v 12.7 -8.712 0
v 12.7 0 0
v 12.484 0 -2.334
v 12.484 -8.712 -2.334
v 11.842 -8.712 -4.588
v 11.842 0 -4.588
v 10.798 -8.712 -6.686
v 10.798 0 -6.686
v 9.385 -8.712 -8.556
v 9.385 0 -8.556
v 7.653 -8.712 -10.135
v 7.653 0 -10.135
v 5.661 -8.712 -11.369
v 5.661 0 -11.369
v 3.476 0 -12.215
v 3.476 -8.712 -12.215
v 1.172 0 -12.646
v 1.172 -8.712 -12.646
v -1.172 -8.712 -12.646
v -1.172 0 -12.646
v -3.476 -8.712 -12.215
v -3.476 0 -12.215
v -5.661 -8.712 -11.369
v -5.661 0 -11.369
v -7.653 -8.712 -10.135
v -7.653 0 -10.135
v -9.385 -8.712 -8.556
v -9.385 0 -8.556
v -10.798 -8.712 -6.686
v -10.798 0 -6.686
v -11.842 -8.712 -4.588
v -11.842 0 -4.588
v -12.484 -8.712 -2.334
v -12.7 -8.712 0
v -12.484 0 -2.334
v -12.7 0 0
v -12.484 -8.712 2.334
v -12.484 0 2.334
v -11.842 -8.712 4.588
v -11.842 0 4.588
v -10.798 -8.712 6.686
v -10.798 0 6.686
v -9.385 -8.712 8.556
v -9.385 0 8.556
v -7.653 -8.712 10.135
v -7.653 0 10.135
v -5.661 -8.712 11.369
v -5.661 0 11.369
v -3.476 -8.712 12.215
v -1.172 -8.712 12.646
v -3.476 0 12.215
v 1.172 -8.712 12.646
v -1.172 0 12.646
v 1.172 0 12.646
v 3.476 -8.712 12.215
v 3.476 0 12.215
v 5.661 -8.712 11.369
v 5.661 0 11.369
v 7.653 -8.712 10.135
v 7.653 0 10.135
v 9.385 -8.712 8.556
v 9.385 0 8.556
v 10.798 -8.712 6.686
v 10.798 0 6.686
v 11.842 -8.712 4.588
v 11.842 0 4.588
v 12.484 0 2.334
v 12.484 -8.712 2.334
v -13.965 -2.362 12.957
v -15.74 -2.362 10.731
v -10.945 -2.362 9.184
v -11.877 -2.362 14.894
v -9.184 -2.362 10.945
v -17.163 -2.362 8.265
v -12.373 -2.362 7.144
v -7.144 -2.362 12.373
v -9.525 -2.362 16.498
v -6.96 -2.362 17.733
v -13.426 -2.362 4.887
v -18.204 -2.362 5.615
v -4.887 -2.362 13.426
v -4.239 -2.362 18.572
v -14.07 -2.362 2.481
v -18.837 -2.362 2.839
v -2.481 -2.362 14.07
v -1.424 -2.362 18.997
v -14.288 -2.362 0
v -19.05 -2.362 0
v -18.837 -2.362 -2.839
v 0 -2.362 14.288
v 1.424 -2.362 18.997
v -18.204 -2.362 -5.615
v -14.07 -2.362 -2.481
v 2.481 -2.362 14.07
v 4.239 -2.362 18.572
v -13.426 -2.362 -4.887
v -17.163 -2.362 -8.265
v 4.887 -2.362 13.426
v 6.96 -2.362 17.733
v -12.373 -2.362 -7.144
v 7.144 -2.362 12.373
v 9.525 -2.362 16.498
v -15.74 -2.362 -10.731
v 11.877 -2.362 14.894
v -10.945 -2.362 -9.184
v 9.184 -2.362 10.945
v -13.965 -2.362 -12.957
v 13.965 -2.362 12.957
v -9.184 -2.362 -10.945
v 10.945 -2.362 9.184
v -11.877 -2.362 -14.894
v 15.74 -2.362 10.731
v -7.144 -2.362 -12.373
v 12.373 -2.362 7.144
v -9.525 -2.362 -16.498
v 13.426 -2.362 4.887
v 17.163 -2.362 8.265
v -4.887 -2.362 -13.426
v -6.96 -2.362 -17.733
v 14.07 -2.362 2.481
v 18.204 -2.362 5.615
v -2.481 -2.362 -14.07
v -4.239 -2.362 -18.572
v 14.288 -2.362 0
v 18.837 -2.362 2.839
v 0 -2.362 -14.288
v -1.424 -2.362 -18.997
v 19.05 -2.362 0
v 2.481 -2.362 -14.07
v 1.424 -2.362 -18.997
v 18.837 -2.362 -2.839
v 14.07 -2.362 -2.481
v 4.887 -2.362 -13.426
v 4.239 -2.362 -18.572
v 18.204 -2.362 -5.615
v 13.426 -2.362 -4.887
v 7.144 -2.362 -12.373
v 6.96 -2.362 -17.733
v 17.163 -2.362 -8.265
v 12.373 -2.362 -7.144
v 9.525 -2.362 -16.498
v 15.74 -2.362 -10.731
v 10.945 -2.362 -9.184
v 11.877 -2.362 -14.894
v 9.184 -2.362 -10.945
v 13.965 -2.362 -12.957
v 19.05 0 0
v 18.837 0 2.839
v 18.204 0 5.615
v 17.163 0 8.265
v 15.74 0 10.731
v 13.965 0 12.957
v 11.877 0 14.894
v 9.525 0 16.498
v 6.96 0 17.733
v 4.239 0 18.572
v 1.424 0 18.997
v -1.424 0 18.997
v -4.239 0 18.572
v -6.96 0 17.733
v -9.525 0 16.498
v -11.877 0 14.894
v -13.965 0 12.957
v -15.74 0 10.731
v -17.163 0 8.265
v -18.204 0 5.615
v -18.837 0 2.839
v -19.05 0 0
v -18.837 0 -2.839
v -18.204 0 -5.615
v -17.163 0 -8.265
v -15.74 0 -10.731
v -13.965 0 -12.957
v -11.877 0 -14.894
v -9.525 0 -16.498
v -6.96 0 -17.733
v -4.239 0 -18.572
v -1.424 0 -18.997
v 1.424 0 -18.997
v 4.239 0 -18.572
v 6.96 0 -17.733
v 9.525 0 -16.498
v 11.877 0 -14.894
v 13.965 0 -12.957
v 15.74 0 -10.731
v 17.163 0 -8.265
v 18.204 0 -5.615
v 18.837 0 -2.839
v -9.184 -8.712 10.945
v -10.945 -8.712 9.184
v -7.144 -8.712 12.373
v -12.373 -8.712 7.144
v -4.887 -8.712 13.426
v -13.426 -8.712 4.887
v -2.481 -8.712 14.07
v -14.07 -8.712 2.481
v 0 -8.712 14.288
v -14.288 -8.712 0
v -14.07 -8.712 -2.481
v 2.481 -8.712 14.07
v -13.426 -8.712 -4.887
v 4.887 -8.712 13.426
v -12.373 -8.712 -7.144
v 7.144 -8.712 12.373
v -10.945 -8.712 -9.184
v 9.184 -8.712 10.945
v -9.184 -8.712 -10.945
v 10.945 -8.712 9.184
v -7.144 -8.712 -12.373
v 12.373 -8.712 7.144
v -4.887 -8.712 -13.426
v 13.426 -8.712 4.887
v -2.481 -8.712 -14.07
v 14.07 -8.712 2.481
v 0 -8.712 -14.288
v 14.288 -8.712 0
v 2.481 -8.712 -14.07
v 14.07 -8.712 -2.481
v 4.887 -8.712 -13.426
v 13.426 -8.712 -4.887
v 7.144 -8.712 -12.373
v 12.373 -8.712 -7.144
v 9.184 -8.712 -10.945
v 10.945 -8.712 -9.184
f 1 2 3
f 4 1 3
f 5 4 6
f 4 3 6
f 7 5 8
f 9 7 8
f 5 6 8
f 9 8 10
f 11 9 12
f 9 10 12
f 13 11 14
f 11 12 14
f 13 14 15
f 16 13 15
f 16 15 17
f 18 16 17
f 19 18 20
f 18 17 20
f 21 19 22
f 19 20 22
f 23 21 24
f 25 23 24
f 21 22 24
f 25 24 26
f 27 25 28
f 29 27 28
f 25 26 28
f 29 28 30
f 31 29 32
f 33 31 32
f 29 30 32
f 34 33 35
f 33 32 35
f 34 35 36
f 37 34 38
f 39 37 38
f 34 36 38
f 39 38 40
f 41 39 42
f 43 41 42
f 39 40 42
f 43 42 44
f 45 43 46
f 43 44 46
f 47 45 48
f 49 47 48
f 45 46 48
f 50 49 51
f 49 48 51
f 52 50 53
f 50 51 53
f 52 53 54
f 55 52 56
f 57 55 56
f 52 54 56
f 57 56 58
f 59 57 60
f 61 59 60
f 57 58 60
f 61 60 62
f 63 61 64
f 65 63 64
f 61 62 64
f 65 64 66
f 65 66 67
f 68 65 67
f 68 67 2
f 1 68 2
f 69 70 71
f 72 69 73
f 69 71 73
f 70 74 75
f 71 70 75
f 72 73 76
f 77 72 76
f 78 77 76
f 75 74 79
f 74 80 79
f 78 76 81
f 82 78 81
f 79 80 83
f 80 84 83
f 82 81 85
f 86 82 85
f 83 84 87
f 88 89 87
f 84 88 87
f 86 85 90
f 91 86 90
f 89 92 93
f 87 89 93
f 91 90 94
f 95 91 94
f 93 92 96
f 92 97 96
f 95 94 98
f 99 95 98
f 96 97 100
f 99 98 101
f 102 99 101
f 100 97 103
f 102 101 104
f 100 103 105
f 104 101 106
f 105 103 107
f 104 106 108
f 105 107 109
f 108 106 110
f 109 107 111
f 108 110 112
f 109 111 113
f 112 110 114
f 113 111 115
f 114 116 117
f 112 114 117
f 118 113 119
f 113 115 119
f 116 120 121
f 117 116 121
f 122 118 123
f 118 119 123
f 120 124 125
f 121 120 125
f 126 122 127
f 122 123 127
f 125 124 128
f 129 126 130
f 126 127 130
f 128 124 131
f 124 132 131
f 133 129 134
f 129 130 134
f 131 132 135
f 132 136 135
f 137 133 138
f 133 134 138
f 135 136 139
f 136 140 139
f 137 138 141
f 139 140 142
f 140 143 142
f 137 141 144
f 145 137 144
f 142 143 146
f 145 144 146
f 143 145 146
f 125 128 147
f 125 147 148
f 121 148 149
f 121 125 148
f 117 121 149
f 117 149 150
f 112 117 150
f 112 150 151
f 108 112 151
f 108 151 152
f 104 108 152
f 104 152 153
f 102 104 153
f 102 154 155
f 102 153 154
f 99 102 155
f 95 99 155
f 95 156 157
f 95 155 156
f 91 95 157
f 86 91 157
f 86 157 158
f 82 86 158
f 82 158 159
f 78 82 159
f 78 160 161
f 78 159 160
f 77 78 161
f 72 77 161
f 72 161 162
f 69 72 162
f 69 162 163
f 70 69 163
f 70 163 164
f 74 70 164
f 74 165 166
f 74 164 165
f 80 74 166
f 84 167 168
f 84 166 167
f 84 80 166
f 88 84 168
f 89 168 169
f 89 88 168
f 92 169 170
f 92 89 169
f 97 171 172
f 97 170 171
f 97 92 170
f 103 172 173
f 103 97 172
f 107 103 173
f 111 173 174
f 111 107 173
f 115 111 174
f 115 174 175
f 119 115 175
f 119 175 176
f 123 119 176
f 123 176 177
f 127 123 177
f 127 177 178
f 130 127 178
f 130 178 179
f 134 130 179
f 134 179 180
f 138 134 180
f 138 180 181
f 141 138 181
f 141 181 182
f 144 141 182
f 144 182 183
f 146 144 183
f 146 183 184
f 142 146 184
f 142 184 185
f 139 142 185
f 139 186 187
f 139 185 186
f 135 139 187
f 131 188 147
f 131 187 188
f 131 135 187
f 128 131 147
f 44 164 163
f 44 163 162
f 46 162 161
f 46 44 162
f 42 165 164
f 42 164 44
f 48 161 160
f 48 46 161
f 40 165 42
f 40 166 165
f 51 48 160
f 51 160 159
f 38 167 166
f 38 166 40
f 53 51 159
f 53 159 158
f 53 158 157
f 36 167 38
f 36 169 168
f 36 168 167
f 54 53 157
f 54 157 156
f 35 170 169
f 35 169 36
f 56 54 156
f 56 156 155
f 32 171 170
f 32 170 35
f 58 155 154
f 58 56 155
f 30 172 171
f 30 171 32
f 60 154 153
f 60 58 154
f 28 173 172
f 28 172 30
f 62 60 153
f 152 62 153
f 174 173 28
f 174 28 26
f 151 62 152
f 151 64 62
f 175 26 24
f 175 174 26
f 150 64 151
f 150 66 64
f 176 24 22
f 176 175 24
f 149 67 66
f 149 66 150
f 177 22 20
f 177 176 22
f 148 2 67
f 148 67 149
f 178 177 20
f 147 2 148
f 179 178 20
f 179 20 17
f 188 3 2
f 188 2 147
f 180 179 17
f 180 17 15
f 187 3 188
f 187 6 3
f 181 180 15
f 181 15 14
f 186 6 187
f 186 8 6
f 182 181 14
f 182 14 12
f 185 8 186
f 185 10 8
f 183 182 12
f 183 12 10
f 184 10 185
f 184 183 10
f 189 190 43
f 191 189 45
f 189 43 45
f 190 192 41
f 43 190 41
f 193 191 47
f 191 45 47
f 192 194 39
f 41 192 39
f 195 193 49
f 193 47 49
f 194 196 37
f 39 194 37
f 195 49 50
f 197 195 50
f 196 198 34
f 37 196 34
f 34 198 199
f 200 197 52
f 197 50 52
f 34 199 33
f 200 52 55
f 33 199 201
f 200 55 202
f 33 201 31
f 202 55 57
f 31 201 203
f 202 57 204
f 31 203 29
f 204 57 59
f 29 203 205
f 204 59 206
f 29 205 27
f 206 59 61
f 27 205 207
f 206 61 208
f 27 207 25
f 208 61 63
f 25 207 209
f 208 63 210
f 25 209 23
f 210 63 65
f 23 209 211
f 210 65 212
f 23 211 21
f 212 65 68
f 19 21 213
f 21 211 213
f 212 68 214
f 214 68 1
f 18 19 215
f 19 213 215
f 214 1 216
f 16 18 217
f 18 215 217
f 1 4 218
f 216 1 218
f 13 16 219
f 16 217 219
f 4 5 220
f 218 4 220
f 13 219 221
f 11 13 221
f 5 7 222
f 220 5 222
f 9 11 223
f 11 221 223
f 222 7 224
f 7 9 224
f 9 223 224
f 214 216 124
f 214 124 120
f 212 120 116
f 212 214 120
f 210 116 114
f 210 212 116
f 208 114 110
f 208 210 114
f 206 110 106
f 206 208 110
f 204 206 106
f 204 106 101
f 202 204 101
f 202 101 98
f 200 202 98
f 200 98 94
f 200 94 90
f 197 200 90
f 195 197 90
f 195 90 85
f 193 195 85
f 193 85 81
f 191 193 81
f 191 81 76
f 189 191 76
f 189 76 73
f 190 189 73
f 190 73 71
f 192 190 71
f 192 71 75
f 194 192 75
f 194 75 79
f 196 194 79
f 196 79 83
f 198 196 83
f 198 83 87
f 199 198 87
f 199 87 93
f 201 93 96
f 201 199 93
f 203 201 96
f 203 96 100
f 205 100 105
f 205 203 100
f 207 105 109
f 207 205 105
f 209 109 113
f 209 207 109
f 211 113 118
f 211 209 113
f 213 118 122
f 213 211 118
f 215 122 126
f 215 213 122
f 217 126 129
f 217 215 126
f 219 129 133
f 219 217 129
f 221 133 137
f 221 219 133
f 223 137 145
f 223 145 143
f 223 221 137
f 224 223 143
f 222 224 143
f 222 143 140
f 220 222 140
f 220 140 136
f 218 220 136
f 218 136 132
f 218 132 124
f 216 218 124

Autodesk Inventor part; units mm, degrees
ref_plane "YZ Plane" through (0, 0, 0) normal (1, 0, 0) x (0, 1, 0)
ref_plane "XZ Plane" through (0, 0, 0) normal (0, 1, 0) x (-1, 0, 0)
ref_plane "XY Plane" through (0, 0, 0) normal (0, 0, 1) x (1, 0, 0)
sketch "Sketch1" plane through (0, 0, 0) normal (0, 0, 1) x (1, 0, 0)
  line L0 (0, 0) -> (19.05, 0)
  line L1 (19.05, 0) -> (19.05, -2.3622)
  line L2 (19.05, -2.3622) -> (14.8082, -2.3622)
  line L3 (14.8082, -2.3622) -> (14.8082, -8.7122)
  line L4 (14.8082, -8.7122) -> (0, -8.7122)
  line L5 (0, -8.7122) -> (0, 0)
  dimension "d2" = 19.05
  dimension "d3" = 2.3622
  dimension "d4" = 4.2418
  dimension "d5" = 6.35
revolve "Revolution1" add sketch "Sketch1" angle 360 about axis through (0, -8.7122, 0) along (0, 1, 0)
sketch "Sketch2" plane through (0, 0, 0) normal (0, 1, 0) x (1, 0, 0)
  circle A0 centre (0, 0) radius 12.7
  dimension "d7" = 25.4
extrude "Extrusion1" cut sketch "Sketch2" against normal blind 25.4
sketch "Sketch3" plane through (0, -8.7122, 0) normal (0, -1, 0) x (1, 0, 0)
  circle A0 centre (0, 0) radius 14.2875
  circle A1 centre (0, 0) radius 14.8082
  dimension "d10" = 28.575
extrude "Extrusion2" cut sketch "Sketch3" against normal blind 6.35
properties part number "BevelWheelSpace_Clearance" material "ABS Plastic"
